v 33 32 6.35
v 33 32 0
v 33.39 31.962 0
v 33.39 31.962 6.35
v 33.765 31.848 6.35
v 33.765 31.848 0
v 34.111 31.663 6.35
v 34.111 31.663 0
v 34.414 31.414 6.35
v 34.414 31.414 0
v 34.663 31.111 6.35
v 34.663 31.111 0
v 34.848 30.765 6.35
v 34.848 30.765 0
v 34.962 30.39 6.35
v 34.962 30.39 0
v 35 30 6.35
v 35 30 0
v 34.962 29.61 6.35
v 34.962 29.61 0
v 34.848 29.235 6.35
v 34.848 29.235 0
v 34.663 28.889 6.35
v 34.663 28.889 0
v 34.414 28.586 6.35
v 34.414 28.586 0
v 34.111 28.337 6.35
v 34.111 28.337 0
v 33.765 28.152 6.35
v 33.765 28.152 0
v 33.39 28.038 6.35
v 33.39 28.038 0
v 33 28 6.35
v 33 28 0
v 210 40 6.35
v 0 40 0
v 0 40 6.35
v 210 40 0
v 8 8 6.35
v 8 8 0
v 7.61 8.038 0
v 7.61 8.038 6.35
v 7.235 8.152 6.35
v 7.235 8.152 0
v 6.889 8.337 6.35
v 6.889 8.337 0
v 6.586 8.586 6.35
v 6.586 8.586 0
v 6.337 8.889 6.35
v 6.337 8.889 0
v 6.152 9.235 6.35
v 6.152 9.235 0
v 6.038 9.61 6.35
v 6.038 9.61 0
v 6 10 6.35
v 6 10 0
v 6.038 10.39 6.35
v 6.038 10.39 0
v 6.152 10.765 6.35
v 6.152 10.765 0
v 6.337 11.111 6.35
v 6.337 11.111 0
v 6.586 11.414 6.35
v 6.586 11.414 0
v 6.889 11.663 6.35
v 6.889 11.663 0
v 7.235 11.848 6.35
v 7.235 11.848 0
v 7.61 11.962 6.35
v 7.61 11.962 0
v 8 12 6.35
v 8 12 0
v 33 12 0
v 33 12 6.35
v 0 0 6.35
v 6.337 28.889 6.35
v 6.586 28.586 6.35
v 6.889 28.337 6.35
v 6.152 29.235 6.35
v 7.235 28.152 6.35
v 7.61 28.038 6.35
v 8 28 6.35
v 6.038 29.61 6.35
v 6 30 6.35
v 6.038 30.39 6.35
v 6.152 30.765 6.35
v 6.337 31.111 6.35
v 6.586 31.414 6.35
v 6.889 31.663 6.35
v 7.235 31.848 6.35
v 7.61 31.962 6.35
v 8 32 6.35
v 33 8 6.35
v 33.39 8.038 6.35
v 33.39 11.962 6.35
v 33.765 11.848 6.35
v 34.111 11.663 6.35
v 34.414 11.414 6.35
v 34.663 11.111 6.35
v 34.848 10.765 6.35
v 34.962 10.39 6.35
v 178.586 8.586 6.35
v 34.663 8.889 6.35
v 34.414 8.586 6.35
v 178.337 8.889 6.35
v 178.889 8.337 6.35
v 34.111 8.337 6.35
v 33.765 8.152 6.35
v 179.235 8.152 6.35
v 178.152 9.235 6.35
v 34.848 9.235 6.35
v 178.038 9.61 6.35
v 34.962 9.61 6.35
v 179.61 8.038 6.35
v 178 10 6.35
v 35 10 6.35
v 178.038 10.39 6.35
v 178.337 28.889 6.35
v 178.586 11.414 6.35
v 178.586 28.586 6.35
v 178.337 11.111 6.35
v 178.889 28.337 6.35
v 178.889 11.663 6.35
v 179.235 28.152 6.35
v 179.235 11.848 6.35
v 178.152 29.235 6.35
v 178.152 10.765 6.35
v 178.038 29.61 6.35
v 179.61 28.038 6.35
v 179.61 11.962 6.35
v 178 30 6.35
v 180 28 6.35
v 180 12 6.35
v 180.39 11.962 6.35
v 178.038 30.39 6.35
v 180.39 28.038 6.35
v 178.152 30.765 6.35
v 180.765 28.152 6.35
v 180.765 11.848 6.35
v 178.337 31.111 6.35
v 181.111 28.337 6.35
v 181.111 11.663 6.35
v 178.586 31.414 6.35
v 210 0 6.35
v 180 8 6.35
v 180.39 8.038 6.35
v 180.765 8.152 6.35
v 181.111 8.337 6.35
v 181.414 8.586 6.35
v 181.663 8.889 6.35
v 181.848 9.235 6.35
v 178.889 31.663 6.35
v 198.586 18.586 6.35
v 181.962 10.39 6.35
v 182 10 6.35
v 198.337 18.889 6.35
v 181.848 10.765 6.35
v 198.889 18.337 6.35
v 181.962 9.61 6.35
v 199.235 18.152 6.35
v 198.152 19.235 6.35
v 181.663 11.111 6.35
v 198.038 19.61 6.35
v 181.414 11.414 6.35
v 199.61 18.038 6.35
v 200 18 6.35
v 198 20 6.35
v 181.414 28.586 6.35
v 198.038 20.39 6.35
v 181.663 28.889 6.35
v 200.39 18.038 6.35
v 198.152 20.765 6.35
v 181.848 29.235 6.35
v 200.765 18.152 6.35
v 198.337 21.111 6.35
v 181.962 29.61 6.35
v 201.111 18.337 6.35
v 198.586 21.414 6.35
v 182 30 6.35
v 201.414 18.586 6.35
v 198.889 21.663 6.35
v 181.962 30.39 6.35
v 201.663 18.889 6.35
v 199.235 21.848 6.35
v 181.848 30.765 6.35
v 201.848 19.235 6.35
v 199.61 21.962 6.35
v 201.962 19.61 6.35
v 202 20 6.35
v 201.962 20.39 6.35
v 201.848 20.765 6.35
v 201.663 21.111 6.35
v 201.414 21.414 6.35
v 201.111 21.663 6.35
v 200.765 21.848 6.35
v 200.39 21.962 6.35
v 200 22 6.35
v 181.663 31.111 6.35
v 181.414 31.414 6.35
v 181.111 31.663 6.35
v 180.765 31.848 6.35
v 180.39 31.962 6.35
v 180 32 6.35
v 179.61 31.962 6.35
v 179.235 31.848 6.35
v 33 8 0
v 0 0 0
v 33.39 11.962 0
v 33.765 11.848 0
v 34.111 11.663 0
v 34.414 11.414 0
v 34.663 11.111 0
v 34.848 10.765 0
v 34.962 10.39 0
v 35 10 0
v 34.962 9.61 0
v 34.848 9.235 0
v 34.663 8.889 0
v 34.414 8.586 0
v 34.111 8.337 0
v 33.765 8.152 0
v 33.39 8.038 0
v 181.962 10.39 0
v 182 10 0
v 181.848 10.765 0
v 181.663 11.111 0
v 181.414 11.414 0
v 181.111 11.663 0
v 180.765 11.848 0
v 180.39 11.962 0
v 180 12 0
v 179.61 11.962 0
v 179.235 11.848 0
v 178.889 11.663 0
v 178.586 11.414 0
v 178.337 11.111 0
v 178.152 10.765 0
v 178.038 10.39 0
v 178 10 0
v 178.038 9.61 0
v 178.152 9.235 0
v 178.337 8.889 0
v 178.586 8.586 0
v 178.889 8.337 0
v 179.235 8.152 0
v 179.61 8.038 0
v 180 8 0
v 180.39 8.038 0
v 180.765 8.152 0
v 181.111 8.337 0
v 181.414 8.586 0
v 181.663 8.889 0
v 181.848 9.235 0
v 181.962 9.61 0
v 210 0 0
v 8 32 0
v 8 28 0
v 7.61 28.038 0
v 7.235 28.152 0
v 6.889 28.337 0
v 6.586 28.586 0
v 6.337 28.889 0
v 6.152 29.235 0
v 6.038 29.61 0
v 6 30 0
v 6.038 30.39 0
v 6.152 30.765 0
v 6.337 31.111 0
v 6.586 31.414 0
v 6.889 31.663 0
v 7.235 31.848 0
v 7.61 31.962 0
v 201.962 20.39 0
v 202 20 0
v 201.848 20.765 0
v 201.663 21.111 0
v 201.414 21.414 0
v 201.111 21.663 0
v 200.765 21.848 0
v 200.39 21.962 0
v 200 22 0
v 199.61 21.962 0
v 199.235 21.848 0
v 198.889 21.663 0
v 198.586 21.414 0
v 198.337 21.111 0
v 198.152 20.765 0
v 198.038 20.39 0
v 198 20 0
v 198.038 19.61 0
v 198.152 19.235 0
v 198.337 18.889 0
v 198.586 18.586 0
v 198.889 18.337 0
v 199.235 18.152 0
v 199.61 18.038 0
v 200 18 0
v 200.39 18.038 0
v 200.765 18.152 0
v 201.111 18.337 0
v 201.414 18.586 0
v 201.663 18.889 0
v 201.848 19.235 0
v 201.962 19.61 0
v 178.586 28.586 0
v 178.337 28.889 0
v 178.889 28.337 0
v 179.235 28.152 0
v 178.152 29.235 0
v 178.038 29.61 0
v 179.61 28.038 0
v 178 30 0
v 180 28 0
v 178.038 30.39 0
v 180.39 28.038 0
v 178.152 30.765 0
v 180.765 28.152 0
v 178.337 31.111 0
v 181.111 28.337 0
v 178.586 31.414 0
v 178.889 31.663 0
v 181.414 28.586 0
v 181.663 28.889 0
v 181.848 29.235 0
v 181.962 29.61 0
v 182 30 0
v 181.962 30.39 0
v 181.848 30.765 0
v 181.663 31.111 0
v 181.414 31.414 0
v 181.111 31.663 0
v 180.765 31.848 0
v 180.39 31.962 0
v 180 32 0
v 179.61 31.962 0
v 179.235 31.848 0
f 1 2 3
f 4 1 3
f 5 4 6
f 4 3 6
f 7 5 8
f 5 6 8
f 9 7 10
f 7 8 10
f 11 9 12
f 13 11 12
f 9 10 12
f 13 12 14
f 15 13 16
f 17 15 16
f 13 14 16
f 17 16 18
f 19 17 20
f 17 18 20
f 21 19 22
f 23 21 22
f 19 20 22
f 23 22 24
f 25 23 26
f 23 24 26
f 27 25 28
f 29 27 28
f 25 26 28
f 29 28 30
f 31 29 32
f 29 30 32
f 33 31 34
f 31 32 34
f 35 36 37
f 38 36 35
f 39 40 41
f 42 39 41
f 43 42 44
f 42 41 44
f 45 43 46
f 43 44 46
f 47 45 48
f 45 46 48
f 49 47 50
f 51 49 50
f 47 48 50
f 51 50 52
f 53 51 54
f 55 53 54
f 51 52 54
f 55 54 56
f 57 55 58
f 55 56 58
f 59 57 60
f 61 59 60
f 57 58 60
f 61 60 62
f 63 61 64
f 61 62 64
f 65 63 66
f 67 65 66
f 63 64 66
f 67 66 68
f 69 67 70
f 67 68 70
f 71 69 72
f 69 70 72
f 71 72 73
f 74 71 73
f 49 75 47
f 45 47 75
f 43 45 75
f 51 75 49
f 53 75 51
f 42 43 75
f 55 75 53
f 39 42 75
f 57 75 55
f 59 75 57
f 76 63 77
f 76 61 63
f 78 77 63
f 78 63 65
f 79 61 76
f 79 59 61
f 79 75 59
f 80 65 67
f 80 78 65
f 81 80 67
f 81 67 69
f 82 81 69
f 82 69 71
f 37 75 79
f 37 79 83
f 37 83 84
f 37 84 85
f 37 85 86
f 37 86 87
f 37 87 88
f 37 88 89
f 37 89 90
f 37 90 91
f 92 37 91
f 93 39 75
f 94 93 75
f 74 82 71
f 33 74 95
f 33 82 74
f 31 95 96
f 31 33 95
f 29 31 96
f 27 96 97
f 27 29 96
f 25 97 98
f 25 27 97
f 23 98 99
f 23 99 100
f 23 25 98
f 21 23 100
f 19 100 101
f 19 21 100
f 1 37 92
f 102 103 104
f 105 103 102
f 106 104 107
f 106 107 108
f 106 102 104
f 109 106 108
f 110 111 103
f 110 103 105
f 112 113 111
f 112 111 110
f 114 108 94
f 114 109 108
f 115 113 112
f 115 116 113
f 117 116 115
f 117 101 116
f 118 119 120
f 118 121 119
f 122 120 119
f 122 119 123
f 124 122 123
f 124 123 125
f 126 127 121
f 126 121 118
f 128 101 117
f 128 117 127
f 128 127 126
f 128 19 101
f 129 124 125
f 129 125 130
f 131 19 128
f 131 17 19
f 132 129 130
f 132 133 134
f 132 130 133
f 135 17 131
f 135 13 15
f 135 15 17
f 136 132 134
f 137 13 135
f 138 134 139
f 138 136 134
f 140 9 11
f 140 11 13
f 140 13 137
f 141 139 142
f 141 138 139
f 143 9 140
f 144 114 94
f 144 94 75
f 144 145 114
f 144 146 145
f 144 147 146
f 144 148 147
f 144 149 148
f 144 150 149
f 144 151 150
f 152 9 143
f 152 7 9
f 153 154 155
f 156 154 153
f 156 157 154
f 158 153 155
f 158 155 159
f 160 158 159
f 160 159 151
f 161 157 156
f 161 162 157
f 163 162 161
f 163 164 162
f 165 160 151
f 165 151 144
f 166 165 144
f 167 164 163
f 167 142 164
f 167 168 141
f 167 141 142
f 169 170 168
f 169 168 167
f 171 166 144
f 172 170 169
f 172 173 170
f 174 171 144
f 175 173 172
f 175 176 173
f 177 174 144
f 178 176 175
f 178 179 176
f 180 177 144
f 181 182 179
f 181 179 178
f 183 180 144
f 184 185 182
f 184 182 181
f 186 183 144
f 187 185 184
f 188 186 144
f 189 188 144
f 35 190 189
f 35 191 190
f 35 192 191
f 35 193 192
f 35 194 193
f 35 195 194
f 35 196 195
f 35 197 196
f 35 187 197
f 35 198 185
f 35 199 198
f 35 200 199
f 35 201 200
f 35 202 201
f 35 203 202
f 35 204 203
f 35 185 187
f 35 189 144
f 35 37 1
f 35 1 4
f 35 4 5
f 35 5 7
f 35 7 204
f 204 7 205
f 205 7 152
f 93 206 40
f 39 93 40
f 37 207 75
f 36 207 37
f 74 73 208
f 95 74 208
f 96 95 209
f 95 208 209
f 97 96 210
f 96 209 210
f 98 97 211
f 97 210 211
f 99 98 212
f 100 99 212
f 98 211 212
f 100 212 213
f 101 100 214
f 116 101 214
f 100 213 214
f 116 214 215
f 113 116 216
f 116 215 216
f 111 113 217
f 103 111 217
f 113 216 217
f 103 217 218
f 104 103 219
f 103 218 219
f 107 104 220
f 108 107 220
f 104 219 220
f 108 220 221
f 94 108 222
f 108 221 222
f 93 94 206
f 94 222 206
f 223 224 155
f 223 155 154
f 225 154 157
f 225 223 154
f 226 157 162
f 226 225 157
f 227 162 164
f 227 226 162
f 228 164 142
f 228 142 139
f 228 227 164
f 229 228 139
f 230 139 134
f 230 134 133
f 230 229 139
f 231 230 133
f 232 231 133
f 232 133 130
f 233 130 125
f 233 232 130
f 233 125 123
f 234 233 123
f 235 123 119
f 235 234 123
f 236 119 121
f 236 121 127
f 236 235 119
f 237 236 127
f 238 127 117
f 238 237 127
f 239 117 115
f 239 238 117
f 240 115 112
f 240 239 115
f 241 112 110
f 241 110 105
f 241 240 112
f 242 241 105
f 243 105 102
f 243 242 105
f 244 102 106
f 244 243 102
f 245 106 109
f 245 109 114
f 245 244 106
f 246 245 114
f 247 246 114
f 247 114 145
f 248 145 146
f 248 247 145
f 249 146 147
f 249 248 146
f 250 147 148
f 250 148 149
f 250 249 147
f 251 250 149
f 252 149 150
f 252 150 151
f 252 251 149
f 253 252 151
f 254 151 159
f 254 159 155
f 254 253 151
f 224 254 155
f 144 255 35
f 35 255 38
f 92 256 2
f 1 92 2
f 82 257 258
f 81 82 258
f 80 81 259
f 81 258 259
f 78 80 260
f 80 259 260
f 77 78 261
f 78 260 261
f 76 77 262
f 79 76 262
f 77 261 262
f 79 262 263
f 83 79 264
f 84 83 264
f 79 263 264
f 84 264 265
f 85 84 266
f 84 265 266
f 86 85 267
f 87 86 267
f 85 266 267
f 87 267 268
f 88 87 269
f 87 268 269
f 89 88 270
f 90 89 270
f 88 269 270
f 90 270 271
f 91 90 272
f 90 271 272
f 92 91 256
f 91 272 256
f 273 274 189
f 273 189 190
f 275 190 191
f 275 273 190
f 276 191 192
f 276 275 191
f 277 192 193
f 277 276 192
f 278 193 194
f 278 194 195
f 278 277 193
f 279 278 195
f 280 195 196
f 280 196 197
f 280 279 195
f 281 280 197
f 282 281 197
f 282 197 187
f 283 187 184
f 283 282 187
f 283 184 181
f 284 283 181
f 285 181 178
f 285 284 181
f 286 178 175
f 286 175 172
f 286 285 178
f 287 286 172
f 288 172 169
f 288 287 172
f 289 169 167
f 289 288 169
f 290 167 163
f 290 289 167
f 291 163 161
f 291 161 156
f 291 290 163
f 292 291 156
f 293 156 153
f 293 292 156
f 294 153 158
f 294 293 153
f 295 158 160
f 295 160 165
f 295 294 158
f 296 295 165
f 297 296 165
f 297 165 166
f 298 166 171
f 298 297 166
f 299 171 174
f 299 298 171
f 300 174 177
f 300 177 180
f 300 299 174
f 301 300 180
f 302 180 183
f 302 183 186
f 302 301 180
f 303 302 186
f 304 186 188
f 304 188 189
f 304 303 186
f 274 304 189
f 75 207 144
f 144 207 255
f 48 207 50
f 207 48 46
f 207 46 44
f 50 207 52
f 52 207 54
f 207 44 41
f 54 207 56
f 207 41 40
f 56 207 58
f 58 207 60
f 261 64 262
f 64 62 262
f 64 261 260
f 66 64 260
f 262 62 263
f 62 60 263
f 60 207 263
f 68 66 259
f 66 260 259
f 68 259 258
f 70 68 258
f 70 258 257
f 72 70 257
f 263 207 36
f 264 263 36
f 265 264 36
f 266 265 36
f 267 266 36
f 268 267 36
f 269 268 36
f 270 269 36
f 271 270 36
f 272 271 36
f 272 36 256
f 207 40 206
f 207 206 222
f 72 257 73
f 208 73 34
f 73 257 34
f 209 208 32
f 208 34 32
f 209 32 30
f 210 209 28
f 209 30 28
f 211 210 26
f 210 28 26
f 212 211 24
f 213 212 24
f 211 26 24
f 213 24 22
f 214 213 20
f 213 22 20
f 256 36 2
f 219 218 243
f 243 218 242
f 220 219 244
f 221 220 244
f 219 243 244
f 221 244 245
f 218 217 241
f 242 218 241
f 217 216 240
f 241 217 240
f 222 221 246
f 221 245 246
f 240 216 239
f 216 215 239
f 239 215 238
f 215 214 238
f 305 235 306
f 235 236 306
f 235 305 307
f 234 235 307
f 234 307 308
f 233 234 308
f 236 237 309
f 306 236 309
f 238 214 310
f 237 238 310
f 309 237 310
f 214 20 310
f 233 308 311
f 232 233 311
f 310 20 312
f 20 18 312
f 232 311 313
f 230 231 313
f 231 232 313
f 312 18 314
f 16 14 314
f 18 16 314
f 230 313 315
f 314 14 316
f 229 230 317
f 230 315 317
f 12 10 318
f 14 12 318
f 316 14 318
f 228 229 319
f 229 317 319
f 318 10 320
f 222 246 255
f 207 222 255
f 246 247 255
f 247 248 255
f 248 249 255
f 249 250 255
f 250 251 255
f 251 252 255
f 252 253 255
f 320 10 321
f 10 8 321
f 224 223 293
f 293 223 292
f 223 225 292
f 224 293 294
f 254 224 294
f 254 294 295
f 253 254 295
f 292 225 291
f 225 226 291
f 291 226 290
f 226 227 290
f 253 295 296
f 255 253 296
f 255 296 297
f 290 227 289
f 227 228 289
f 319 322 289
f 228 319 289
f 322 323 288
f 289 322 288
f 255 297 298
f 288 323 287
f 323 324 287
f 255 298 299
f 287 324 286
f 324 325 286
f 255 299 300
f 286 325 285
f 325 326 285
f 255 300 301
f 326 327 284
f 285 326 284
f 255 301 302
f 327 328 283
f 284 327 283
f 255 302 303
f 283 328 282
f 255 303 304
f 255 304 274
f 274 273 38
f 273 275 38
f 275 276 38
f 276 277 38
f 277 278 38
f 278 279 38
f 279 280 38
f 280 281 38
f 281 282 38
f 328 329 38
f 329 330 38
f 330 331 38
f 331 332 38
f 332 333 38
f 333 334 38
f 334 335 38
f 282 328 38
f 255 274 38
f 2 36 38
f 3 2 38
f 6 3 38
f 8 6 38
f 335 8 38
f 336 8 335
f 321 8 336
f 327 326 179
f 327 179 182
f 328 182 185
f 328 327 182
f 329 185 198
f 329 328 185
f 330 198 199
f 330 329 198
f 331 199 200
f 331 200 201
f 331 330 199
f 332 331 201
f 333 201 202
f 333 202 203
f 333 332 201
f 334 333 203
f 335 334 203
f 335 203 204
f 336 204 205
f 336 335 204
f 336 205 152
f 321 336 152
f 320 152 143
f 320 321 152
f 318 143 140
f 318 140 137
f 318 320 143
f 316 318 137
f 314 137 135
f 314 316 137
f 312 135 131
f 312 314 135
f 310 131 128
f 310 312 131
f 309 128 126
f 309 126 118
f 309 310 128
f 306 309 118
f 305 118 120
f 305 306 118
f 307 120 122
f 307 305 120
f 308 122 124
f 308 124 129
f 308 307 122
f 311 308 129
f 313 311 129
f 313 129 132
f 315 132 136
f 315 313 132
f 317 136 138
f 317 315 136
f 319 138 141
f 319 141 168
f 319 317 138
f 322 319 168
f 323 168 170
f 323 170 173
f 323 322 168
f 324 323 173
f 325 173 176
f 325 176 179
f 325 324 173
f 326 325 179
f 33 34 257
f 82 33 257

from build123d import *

# Parameters (mm, degrees)
SKETCH1_W           = 210
SKETCH1_H           = 40
SKETCH1_R           = 2
BOSS_EXTRUDE1_DEPTH = 6.35


with BuildPart() as part:
    # Sketch1 → Boss-Extrude1 (new body)
    with BuildSketch(Plane.XY):
        with Locations((105, 20)):
            Rectangle(SKETCH1_W, SKETCH1_H)
        with Locations((180, 30)):
            Circle(SKETCH1_R, mode=Mode.SUBTRACT)
        with Locations((180, 10)):
            Circle(SKETCH1_R, mode=Mode.SUBTRACT)
        with Locations((200, 20)):
            Circle(SKETCH1_R, mode=Mode.SUBTRACT)
        with BuildLine():
            Line((8, 32), (33, 32))
            ThreePointArc((33, 32), (35, 30), (33, 28))
            Line((33, 28), (8, 28))
            ThreePointArc((8, 28), (6, 30), (8, 32))
        make_face(mode=Mode.SUBTRACT)
        with BuildLine():
            Line((8, 12), (33, 12))
            ThreePointArc((33, 12), (35, 10), (33, 8))
            Line((33, 8), (8, 8))
            ThreePointArc((8, 8), (6, 10), (8, 12))
        make_face(mode=Mode.SUBTRACT)
    extrude(amount=BOSS_EXTRUDE1_DEPTH)


solid = part.part
